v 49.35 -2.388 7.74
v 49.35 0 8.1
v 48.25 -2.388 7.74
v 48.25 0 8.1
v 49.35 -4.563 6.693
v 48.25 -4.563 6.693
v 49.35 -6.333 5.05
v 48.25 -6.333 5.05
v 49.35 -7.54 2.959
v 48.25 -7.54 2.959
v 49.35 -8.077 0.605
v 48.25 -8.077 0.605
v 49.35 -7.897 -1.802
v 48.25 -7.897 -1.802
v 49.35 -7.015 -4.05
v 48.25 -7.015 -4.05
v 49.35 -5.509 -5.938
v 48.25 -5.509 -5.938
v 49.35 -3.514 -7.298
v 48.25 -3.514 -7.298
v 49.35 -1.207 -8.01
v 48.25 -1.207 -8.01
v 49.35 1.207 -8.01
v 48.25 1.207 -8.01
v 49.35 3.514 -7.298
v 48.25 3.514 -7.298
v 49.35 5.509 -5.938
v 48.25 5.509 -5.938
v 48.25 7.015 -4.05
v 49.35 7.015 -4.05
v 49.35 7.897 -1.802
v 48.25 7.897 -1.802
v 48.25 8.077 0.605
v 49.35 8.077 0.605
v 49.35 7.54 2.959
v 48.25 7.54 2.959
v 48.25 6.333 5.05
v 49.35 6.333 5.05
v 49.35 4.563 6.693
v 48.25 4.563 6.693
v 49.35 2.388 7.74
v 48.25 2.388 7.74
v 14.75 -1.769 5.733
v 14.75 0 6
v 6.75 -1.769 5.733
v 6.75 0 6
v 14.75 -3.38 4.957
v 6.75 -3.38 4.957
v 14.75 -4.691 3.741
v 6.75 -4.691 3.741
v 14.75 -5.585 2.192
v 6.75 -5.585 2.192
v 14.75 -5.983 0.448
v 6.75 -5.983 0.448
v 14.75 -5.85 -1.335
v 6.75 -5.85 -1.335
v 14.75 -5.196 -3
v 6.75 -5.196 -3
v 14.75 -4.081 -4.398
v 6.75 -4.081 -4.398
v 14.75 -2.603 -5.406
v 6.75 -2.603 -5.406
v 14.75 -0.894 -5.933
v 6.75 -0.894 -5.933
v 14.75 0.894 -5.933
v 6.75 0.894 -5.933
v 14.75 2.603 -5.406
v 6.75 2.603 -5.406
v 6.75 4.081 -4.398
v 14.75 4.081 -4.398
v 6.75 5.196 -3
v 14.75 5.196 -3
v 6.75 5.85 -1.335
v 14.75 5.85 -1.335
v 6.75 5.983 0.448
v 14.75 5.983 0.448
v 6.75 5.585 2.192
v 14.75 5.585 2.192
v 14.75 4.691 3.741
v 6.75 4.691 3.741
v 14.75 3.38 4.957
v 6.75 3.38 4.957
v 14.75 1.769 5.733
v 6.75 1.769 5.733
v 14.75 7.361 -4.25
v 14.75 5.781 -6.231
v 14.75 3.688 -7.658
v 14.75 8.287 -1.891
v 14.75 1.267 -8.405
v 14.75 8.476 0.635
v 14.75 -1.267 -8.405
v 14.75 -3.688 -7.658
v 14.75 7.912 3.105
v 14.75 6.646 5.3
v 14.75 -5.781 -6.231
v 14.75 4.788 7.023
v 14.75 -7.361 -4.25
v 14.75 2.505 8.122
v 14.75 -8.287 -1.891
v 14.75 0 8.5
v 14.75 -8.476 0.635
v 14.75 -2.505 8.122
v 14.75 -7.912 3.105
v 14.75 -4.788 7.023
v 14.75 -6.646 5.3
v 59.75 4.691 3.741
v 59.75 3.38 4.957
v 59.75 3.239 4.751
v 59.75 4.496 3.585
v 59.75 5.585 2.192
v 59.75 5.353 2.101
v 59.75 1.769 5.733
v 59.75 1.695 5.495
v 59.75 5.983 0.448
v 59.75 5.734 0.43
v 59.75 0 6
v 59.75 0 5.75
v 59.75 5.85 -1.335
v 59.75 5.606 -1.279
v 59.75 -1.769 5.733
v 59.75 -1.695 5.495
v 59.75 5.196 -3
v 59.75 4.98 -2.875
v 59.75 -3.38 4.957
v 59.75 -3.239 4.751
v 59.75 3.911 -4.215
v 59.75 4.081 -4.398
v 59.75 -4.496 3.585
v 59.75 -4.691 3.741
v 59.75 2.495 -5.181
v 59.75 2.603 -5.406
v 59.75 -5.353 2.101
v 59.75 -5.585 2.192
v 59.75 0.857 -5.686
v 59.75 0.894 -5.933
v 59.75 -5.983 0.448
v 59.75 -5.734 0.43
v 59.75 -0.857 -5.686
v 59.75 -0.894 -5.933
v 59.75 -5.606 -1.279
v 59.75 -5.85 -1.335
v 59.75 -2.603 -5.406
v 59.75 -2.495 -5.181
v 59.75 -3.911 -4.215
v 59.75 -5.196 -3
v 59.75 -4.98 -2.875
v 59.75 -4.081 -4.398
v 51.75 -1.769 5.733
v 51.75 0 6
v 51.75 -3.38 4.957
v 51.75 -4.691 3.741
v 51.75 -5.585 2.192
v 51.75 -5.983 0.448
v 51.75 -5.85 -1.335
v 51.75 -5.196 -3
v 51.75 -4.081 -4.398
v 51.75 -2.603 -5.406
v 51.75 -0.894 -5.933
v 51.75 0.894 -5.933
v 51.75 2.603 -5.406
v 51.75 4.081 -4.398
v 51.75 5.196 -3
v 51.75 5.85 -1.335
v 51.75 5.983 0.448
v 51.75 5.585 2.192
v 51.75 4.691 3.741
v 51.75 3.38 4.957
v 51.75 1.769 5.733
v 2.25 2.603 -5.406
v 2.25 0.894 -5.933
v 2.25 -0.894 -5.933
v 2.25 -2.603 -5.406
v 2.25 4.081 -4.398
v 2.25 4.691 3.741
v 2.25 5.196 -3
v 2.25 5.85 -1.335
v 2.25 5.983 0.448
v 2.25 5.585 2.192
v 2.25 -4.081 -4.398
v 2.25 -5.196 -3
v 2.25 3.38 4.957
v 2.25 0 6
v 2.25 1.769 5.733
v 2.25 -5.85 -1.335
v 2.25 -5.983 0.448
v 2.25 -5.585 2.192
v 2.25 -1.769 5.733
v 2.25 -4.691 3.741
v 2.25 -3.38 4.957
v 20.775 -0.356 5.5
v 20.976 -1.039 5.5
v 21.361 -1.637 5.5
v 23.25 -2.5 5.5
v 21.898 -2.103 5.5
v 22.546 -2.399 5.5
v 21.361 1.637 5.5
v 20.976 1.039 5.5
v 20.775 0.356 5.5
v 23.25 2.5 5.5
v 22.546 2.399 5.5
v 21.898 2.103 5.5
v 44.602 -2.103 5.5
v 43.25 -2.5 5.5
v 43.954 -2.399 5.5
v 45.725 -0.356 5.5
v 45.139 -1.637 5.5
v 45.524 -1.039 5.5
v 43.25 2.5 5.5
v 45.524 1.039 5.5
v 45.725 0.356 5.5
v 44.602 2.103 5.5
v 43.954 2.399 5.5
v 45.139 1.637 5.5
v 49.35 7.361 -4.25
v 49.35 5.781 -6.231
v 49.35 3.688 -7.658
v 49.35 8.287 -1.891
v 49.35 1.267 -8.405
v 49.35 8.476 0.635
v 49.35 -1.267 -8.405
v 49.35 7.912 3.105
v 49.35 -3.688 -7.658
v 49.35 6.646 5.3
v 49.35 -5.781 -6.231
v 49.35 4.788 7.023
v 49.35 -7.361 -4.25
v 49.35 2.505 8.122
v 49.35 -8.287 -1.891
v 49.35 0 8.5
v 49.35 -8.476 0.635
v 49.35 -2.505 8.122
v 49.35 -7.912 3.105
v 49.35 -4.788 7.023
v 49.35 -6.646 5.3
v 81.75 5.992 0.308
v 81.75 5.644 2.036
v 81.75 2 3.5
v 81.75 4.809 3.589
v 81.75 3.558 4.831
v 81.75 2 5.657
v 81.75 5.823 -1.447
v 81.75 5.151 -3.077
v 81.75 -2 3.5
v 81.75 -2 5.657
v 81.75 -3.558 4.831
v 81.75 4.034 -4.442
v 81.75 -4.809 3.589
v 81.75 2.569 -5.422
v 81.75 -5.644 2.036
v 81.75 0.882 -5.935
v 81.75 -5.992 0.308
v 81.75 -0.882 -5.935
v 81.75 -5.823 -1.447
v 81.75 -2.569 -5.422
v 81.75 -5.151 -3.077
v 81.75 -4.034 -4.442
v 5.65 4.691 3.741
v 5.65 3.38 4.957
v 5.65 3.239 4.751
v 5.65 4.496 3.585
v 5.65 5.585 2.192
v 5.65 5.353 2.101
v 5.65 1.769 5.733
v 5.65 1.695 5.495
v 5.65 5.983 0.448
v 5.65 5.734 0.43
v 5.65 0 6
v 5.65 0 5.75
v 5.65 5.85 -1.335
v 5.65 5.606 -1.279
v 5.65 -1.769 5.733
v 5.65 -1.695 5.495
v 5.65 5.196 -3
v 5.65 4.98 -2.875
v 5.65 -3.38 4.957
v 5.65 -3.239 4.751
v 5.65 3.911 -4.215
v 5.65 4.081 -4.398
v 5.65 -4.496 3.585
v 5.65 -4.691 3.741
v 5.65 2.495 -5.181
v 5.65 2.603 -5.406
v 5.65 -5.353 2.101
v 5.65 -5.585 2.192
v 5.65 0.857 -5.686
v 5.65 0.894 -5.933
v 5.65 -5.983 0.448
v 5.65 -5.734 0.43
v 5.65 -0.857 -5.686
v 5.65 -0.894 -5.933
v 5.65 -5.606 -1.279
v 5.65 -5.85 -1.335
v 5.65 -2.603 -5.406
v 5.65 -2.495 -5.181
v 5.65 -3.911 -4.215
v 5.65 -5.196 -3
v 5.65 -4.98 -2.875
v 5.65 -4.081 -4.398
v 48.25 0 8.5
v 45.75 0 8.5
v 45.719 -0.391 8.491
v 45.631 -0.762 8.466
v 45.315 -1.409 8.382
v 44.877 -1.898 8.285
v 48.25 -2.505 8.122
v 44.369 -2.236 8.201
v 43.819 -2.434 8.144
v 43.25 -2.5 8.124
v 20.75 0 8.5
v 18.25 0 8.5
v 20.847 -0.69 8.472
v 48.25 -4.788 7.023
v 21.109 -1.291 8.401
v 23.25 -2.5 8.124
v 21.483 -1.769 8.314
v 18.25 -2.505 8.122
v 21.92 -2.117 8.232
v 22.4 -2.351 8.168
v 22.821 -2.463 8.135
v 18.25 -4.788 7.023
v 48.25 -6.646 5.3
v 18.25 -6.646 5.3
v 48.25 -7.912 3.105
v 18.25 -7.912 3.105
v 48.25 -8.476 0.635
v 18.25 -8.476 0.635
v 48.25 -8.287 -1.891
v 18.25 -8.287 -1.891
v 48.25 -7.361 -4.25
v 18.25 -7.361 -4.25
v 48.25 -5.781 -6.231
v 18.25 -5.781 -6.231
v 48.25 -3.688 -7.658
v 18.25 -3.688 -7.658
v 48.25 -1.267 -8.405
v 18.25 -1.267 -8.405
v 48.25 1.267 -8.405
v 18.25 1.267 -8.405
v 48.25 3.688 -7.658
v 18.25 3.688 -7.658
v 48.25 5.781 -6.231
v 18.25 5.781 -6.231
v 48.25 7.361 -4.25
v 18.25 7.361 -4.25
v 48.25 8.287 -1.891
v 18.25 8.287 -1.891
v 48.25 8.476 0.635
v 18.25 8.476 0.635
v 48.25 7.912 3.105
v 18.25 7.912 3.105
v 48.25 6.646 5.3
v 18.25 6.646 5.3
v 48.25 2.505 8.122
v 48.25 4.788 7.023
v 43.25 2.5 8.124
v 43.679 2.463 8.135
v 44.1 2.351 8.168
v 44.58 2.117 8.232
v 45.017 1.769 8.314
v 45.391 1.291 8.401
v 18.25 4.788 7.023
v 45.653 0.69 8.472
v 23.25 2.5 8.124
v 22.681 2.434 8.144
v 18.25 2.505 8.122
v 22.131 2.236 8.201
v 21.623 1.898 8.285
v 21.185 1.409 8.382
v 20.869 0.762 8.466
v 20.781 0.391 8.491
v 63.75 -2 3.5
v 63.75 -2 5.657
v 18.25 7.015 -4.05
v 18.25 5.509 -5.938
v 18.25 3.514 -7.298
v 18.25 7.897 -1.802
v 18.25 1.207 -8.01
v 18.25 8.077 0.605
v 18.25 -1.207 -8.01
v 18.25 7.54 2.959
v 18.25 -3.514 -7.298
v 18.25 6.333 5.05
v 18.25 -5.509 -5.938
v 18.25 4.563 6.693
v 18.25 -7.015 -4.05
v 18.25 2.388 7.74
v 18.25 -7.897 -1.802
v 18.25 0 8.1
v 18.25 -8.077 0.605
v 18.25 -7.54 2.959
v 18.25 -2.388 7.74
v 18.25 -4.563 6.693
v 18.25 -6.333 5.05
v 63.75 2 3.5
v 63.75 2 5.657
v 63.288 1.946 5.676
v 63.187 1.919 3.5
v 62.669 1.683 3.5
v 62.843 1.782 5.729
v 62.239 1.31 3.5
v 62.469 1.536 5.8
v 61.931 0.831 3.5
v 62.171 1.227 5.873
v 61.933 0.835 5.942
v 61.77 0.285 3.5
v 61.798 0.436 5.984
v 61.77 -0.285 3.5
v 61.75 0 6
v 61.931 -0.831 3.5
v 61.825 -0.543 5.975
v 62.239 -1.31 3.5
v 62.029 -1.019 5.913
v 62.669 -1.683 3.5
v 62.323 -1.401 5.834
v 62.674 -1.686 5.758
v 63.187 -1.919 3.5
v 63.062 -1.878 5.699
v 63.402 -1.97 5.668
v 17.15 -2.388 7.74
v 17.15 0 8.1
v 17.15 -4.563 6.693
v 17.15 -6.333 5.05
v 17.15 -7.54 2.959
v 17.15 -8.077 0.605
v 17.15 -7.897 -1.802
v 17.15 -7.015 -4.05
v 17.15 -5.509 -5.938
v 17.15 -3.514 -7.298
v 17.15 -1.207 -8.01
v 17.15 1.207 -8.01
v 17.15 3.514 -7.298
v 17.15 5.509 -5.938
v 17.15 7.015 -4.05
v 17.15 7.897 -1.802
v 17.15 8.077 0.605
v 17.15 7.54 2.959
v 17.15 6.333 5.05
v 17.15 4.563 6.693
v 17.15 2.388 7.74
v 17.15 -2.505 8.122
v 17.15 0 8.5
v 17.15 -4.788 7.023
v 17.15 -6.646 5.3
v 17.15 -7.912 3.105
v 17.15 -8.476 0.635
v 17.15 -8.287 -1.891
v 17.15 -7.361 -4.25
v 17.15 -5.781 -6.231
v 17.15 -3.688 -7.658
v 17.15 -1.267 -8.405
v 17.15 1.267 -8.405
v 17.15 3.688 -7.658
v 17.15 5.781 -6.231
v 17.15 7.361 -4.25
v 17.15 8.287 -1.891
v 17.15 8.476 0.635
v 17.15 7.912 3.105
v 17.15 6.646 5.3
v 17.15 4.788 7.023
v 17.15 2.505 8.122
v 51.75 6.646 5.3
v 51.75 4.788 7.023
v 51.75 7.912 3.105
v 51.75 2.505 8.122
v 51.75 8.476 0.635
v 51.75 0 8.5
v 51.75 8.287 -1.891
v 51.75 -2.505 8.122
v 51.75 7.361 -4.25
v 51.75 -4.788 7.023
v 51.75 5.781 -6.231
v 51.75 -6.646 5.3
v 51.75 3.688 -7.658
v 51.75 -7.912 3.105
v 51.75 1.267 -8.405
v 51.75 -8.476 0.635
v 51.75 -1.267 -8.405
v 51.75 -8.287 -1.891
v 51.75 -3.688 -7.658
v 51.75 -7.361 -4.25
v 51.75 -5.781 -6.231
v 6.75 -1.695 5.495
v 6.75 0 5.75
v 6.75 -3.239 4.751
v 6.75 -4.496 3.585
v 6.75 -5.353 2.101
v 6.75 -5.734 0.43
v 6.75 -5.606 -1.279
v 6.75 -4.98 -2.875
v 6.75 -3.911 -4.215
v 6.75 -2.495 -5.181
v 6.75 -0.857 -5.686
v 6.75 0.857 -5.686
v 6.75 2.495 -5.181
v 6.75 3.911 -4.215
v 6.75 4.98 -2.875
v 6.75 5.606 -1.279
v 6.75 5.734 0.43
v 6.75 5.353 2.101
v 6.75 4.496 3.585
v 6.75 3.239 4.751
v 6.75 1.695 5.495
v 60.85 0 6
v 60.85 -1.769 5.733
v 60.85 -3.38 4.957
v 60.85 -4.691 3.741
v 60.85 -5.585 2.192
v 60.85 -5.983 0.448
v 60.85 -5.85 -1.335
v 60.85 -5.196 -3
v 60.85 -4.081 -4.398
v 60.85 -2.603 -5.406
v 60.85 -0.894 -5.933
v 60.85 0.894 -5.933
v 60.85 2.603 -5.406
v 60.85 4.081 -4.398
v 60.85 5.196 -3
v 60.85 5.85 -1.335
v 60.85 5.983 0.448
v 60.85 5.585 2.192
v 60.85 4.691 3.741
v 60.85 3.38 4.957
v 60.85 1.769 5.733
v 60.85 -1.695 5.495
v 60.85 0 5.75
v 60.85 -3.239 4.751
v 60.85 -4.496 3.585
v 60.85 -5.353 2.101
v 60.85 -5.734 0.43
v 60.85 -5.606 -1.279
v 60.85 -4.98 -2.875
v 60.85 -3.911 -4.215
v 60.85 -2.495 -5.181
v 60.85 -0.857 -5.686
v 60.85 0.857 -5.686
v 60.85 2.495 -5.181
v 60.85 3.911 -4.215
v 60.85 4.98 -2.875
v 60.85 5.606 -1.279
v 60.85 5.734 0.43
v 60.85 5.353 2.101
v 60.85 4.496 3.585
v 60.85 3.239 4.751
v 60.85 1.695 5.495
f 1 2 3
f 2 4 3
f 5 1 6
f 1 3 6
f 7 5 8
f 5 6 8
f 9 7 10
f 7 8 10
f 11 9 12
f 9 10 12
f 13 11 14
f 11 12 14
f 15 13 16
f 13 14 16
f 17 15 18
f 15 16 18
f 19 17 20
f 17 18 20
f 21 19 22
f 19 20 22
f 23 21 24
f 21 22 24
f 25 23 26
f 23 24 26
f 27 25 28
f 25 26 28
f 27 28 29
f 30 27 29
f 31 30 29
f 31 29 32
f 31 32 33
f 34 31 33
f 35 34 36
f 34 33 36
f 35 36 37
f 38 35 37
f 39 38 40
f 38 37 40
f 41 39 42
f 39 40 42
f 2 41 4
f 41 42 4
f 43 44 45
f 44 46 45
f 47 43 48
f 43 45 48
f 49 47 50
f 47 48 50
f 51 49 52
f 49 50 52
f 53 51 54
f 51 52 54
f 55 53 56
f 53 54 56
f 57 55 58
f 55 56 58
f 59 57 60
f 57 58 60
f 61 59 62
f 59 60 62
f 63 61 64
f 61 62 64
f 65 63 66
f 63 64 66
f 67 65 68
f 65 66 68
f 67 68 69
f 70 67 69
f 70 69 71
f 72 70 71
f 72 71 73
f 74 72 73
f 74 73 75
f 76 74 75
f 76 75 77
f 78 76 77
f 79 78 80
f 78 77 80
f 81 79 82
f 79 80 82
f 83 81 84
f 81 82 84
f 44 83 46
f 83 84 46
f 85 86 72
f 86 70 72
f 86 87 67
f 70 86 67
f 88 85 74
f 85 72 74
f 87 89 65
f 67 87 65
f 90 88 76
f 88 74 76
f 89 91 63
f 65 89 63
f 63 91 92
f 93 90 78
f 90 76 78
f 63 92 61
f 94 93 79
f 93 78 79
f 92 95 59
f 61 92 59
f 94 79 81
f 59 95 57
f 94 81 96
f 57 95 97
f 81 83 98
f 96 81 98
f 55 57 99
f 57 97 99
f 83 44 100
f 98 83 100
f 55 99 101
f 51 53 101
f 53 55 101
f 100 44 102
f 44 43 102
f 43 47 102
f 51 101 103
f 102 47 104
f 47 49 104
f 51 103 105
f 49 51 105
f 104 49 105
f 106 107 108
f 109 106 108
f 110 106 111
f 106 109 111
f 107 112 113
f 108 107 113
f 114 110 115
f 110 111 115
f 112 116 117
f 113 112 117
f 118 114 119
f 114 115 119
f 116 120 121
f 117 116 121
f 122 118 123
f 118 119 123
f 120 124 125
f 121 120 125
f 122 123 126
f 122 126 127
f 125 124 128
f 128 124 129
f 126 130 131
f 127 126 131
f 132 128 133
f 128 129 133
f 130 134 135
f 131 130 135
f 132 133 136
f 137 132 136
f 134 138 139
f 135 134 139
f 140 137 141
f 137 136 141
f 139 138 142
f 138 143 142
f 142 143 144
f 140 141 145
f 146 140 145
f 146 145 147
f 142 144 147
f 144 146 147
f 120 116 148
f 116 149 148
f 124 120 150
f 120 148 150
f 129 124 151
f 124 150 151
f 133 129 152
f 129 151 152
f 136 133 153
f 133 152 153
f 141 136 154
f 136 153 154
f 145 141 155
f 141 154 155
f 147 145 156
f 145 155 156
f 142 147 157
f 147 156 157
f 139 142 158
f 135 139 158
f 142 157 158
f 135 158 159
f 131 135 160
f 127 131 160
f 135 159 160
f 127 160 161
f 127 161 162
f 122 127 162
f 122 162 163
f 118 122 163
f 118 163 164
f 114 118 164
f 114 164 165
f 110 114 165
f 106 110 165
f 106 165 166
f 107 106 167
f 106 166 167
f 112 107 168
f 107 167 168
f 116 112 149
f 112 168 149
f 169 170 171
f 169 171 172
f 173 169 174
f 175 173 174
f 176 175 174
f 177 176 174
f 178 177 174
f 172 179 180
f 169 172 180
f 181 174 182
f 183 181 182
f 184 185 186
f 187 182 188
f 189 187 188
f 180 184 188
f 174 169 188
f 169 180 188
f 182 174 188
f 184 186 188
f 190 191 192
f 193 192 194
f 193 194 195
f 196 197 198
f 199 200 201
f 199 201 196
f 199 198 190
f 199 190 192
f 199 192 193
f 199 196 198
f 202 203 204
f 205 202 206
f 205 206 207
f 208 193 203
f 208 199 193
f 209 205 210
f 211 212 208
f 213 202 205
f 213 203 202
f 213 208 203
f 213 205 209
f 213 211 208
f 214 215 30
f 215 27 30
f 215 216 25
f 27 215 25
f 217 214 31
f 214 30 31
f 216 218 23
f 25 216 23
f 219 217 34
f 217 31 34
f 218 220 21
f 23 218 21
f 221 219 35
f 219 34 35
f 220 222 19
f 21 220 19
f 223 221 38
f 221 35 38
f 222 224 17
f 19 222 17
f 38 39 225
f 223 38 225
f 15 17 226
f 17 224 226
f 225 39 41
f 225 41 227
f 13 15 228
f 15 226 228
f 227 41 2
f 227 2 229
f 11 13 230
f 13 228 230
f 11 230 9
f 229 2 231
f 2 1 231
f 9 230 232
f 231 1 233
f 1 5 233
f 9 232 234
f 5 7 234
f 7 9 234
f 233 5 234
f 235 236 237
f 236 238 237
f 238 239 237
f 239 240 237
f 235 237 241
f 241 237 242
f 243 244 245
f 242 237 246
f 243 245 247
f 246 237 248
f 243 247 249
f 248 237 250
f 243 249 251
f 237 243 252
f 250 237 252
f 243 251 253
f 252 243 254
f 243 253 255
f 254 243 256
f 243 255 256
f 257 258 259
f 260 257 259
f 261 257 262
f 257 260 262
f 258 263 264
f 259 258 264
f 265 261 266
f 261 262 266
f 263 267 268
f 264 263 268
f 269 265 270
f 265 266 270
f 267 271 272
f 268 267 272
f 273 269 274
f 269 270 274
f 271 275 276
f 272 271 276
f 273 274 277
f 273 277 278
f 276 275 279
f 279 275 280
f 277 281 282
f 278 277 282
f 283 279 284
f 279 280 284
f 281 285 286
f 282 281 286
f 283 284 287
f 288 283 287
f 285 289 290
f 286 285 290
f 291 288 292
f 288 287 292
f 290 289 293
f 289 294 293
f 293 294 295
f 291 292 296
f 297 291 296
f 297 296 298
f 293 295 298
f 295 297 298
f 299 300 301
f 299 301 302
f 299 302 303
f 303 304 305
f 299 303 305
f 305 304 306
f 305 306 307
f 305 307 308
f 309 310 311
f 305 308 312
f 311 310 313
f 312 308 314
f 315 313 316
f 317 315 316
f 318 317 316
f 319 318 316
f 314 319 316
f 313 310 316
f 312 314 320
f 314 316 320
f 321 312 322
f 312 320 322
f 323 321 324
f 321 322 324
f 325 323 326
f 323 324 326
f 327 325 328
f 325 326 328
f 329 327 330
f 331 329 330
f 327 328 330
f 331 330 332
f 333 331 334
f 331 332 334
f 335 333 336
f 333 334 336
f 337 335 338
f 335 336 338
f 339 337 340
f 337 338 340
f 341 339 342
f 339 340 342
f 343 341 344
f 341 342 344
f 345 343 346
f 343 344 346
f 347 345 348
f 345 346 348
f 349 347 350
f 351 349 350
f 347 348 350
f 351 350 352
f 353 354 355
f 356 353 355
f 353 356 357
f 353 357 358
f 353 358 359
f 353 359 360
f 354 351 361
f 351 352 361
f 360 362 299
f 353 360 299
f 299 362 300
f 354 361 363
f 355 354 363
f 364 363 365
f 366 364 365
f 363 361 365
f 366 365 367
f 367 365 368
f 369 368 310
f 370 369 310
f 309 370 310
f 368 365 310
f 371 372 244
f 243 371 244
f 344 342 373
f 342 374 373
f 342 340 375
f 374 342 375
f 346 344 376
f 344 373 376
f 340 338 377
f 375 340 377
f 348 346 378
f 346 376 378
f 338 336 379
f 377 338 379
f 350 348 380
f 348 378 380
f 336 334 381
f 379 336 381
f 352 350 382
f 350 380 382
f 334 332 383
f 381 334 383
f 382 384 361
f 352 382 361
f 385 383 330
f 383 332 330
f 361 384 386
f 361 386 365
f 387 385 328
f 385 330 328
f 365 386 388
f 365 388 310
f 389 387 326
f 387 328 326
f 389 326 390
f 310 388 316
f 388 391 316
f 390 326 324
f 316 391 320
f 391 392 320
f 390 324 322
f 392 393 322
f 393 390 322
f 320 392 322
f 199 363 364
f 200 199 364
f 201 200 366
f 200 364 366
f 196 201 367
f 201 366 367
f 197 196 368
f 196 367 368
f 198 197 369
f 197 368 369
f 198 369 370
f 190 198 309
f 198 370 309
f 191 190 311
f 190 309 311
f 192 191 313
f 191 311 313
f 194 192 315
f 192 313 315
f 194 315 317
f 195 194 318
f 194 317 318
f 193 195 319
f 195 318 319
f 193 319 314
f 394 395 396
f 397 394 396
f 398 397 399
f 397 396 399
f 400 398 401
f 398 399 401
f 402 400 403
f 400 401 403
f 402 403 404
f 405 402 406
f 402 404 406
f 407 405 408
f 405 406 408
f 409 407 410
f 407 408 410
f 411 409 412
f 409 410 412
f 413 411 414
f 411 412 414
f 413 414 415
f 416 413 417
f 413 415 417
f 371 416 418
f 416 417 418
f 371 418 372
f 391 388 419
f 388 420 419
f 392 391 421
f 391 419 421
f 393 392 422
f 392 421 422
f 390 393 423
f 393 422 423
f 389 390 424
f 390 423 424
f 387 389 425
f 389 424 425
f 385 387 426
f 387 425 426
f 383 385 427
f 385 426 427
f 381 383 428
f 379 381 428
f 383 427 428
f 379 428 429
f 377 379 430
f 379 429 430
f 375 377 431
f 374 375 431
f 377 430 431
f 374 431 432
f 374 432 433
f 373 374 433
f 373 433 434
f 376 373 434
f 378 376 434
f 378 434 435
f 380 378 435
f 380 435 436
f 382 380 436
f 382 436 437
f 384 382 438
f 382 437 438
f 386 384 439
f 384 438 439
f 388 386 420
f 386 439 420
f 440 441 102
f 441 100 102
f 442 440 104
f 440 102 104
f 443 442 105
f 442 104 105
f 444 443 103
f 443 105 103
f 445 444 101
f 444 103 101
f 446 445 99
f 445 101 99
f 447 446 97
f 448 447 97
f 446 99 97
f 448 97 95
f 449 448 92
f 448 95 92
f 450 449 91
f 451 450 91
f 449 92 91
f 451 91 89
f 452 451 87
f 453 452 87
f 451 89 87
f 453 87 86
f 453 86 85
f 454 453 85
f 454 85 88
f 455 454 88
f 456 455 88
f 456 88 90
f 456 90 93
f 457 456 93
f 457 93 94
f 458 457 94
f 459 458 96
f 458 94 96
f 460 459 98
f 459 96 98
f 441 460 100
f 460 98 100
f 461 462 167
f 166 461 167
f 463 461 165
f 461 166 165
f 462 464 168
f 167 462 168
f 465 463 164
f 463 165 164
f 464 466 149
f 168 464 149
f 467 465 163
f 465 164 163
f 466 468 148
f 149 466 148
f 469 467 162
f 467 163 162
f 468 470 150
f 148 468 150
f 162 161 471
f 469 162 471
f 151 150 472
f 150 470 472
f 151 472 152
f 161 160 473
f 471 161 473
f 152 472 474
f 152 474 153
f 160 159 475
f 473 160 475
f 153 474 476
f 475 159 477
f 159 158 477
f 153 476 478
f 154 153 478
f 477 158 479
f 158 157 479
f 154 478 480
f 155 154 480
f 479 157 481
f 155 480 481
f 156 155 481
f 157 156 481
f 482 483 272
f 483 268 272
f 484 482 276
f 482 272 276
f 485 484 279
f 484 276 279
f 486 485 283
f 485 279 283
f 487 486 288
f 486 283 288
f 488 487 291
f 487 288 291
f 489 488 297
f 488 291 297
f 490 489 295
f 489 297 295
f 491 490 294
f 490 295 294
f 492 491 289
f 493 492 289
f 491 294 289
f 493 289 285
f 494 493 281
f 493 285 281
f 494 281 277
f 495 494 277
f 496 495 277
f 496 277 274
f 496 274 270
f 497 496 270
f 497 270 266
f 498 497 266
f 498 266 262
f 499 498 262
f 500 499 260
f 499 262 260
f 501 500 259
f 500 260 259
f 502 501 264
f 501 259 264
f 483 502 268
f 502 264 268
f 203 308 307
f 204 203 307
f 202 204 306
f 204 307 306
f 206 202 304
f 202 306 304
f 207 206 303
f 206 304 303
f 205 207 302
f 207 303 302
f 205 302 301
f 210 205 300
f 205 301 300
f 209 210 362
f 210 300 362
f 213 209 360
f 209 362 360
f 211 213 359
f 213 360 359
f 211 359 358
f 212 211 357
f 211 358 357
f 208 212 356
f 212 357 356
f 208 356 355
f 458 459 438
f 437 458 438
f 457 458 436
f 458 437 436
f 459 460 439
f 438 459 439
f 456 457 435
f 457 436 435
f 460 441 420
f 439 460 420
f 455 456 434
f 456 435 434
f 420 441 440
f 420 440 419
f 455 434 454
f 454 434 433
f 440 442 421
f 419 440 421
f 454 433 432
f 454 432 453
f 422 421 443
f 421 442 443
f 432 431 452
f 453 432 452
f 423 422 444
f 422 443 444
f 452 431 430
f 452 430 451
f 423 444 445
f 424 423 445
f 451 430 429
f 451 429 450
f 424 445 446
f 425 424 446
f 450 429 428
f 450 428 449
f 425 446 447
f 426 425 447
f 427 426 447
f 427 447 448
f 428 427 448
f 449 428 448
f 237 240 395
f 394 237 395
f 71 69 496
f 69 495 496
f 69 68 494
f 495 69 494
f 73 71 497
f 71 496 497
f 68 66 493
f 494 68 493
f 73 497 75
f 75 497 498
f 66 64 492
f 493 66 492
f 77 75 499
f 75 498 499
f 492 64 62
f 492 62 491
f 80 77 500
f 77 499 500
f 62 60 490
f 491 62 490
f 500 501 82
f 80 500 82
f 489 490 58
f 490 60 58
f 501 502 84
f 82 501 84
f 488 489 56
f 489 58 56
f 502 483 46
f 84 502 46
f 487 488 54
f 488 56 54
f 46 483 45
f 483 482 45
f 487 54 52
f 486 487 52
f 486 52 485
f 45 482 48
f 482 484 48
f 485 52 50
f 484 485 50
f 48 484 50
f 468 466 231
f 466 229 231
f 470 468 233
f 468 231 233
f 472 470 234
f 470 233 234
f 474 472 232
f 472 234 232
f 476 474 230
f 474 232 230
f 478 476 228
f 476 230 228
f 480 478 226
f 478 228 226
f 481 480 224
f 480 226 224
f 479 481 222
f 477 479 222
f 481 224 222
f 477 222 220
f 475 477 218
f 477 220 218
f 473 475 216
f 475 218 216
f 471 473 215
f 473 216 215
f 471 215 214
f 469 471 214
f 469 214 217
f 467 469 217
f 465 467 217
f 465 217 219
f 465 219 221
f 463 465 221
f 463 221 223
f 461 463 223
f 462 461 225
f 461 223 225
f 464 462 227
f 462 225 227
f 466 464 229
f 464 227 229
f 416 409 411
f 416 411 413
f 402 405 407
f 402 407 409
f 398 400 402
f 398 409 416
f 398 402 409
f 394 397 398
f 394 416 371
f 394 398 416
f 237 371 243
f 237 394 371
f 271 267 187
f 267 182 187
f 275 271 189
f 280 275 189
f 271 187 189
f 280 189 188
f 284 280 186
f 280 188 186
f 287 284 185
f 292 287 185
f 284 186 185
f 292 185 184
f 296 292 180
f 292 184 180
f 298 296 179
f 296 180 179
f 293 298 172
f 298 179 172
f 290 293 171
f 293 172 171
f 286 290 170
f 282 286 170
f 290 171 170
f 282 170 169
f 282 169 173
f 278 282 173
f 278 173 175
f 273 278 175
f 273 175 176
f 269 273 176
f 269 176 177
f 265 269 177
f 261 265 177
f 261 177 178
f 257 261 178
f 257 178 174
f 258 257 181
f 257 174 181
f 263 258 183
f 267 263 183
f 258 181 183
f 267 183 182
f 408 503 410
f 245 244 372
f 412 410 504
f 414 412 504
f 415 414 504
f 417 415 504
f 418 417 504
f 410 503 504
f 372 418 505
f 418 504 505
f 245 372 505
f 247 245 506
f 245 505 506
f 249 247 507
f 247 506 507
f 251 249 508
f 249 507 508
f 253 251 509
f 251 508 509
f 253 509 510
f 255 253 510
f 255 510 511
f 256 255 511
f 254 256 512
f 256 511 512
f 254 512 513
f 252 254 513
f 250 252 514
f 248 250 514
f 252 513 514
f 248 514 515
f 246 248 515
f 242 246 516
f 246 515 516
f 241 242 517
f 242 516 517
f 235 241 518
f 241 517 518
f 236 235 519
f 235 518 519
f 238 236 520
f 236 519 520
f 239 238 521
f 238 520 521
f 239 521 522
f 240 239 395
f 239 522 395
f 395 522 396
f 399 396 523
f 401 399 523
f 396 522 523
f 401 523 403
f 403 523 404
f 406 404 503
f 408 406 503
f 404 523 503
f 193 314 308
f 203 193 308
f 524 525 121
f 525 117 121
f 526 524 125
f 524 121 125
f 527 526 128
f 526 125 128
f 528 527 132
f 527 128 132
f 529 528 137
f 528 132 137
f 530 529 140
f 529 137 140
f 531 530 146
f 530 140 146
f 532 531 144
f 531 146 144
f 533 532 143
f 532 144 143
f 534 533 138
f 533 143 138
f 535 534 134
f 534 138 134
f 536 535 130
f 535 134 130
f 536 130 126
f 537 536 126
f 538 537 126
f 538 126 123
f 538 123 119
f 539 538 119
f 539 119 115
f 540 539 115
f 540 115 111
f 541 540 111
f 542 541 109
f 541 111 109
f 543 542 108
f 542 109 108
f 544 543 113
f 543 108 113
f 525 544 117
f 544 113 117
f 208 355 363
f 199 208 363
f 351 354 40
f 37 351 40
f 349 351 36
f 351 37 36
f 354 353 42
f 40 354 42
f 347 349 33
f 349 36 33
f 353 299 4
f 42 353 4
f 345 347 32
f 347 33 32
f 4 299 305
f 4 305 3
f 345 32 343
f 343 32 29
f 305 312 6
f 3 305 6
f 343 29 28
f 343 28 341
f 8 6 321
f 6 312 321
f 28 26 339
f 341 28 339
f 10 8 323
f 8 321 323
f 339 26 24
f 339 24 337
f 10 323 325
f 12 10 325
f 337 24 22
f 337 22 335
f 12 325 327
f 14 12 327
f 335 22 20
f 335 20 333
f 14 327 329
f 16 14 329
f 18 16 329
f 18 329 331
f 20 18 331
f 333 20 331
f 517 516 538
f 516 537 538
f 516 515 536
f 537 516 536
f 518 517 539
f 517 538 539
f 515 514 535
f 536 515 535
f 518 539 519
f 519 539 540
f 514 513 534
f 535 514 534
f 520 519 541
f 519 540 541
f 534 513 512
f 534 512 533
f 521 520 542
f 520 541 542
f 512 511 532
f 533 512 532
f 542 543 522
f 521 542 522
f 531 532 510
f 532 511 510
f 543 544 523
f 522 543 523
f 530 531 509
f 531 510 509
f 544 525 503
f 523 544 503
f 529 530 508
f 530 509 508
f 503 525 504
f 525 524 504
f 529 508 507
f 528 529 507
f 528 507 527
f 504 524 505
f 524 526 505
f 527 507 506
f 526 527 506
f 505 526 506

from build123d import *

# Parameters (mm, degrees)
F4_DEPTH = 3
F7_DEPTH = 2.5


with BuildPart() as f1:
    # F0 (on Front) → F1 (revolve)
    with BuildSketch(Plane.XZ):
        Polygon((2.250003, 6), (2.250003, 0), (64.250003, 0), (81.750003, 0), (81.750003, 6), (64.250003, 6), (60.850003, 6), (60.850003, 5.75), (59.750003, 5.75), (59.750003, 6), (51.750003, 6), (51.750003, 8.5), (49.350003, 8.5), (49.350003, 8.1), (48.250003, 8.1), (48.250003, 8.5), (18.250003, 8.5), (18.250003, 8.1), (17.150003, 8.1), (17.150003, 8.5), (14.750003, 8.5), (14.750003, 6), (6.750003, 6), (6.750003, 5.75), (5.650003, 5.75), (5.650003, 6), align=None)
    revolve(axis=Axis((33.250003, 0, 0), (1, 0, 0)))

    # F3 (on offset) → F4 (cut)
    with BuildSketch(Plane.XY.offset(8.5)):
        with BuildLine():
            Line((43.250003, 2.5), (23.250003, 2.5))
            ThreePointArc((23.250003, 2.5), (20.750003, 0), (23.250003, -2.5))
            Line((23.250003, -2.5), (43.250003, -2.5))
            ThreePointArc((43.250003, -2.5), (45.750003, 0), (43.250003, 2.5))
        make_face()
    extrude(amount=-F4_DEPTH, mode=Mode.SUBTRACT)

    # F6 (on offset) → F7 (cut)
    with BuildSketch(Plane.XY.offset(6)):
        with BuildLine():
            Line((82.259692, 2), (63.750003, 2))
            ThreePointArc((63.750003, 2), (61.750003, 0), (63.750003, -2))
            Line((63.750003, -2), (82.259692, -2))
            Line((82.259692, -2), (82.259692, 2))
        make_face()
    extrude(amount=-F7_DEPTH, mode=Mode.SUBTRACT)


solid = f1.part
